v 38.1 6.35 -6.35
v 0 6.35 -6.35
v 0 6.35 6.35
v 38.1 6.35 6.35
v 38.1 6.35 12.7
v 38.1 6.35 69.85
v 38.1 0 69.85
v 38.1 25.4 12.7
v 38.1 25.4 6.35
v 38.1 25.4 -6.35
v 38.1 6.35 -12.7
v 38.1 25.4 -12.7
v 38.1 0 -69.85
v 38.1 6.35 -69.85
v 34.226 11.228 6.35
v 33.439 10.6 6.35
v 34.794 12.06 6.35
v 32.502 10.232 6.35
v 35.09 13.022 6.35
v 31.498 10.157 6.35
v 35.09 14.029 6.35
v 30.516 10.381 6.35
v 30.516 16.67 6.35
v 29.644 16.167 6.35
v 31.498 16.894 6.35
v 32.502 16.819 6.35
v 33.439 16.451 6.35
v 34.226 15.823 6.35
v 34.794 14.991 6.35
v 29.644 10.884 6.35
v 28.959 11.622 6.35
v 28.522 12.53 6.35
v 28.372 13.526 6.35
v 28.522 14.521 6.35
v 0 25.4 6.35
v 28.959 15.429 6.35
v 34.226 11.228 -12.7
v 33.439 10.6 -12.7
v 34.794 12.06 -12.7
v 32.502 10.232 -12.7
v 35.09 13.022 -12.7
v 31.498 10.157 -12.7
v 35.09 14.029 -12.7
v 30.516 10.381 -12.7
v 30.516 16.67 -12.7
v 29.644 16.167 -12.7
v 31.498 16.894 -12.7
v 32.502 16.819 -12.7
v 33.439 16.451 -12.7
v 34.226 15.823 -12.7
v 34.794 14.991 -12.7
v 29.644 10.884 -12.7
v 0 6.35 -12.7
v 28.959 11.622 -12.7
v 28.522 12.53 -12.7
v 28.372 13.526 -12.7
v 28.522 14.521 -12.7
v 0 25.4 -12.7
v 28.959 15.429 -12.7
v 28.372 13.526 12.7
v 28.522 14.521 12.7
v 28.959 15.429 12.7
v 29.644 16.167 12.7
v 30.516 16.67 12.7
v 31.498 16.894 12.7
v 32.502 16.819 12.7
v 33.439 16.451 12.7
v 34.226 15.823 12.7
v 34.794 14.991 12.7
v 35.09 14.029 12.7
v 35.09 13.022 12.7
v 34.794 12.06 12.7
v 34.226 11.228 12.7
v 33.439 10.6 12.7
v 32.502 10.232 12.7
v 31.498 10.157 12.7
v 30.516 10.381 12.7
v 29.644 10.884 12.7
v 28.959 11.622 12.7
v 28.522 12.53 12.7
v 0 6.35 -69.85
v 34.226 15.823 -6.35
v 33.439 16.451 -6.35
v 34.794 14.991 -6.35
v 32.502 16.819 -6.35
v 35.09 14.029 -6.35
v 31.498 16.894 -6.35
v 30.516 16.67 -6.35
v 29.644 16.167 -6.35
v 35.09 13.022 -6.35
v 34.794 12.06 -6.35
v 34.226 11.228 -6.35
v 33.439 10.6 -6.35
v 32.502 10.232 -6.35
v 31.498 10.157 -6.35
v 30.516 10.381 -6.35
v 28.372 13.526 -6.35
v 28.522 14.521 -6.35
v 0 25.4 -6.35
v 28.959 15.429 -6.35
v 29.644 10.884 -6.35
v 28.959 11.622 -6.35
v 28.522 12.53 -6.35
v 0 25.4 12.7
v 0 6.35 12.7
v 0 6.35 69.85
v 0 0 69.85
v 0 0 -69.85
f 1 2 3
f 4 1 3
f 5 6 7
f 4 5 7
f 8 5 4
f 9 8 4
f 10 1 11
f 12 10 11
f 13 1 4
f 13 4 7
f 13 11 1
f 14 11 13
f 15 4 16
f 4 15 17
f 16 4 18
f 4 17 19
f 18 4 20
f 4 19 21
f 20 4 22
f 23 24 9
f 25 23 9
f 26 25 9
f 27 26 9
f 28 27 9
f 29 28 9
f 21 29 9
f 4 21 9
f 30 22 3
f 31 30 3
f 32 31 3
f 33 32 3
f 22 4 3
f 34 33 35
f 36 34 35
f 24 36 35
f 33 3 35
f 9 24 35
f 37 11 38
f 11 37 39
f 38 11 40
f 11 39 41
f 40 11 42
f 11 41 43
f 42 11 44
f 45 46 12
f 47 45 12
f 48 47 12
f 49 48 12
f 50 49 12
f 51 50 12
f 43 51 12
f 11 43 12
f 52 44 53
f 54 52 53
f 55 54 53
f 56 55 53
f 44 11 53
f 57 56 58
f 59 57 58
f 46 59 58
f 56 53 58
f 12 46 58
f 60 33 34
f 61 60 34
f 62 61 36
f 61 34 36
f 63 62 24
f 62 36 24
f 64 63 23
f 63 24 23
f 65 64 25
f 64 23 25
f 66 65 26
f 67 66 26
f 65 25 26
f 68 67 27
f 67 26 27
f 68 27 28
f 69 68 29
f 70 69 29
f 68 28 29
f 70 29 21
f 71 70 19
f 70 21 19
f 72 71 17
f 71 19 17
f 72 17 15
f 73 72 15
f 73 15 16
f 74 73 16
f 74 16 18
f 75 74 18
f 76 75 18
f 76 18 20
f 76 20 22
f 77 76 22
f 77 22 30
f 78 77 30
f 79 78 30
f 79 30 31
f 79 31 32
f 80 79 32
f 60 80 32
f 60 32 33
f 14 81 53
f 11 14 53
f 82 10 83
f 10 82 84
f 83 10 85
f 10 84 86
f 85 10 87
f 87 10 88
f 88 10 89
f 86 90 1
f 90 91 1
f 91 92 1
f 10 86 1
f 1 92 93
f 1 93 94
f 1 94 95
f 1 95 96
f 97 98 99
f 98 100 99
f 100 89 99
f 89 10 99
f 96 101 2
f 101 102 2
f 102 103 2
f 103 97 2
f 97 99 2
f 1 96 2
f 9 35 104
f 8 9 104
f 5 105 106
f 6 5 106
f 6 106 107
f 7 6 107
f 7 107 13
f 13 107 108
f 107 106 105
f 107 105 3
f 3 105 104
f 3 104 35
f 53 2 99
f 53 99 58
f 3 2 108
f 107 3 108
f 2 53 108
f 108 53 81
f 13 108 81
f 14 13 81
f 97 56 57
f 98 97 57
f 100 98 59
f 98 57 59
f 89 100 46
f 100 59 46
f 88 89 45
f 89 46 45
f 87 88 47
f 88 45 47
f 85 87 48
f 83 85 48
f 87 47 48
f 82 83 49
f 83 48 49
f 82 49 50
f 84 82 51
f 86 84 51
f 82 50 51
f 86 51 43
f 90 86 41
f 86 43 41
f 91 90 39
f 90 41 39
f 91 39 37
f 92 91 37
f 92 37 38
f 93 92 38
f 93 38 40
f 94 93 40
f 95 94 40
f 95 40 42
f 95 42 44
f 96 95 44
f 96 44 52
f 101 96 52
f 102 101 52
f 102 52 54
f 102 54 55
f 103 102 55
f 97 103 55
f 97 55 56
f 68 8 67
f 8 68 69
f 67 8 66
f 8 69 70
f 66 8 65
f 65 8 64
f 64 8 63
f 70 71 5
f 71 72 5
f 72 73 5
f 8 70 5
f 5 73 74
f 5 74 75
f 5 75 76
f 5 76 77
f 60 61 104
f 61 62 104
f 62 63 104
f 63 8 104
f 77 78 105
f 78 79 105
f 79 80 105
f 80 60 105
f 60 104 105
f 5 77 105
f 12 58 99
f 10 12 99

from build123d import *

# Parameters (mm, degrees)
BOSS_EXTRUDE1_DEPTH     = 38.1
F_1_4_CLEARANCE_HOLE3_D = 6.7564


with BuildPart() as part:
    # Sketch1 → Boss-Extrude1 (new body)
    with BuildSketch(Plane(origin=(0, 0, 0), x_dir=(0, 0, -1), z_dir=(1, 0, 0))):
        Polygon((-69.85, 0), (69.85, 0), (69.85, 6.35), (12.7, 6.35), (12.7, 25.4), (6.35, 25.4), (6.35, 6.35), (-6.35, 6.35), (-6.35, 25.4), (-12.7, 25.4), (-12.7, 6.35), (-69.85, 6.35), align=None)
    extrude(amount=BOSS_EXTRUDE1_DEPTH)

    # 1/4 Clearance Hole3 (through all)
    with Locations(Plane.XY.offset(12.7)):
        with Locations((31.75, 13.5255)):
            Hole(F_1_4_CLEARANCE_HOLE3_D / 2)


solid = part.part
